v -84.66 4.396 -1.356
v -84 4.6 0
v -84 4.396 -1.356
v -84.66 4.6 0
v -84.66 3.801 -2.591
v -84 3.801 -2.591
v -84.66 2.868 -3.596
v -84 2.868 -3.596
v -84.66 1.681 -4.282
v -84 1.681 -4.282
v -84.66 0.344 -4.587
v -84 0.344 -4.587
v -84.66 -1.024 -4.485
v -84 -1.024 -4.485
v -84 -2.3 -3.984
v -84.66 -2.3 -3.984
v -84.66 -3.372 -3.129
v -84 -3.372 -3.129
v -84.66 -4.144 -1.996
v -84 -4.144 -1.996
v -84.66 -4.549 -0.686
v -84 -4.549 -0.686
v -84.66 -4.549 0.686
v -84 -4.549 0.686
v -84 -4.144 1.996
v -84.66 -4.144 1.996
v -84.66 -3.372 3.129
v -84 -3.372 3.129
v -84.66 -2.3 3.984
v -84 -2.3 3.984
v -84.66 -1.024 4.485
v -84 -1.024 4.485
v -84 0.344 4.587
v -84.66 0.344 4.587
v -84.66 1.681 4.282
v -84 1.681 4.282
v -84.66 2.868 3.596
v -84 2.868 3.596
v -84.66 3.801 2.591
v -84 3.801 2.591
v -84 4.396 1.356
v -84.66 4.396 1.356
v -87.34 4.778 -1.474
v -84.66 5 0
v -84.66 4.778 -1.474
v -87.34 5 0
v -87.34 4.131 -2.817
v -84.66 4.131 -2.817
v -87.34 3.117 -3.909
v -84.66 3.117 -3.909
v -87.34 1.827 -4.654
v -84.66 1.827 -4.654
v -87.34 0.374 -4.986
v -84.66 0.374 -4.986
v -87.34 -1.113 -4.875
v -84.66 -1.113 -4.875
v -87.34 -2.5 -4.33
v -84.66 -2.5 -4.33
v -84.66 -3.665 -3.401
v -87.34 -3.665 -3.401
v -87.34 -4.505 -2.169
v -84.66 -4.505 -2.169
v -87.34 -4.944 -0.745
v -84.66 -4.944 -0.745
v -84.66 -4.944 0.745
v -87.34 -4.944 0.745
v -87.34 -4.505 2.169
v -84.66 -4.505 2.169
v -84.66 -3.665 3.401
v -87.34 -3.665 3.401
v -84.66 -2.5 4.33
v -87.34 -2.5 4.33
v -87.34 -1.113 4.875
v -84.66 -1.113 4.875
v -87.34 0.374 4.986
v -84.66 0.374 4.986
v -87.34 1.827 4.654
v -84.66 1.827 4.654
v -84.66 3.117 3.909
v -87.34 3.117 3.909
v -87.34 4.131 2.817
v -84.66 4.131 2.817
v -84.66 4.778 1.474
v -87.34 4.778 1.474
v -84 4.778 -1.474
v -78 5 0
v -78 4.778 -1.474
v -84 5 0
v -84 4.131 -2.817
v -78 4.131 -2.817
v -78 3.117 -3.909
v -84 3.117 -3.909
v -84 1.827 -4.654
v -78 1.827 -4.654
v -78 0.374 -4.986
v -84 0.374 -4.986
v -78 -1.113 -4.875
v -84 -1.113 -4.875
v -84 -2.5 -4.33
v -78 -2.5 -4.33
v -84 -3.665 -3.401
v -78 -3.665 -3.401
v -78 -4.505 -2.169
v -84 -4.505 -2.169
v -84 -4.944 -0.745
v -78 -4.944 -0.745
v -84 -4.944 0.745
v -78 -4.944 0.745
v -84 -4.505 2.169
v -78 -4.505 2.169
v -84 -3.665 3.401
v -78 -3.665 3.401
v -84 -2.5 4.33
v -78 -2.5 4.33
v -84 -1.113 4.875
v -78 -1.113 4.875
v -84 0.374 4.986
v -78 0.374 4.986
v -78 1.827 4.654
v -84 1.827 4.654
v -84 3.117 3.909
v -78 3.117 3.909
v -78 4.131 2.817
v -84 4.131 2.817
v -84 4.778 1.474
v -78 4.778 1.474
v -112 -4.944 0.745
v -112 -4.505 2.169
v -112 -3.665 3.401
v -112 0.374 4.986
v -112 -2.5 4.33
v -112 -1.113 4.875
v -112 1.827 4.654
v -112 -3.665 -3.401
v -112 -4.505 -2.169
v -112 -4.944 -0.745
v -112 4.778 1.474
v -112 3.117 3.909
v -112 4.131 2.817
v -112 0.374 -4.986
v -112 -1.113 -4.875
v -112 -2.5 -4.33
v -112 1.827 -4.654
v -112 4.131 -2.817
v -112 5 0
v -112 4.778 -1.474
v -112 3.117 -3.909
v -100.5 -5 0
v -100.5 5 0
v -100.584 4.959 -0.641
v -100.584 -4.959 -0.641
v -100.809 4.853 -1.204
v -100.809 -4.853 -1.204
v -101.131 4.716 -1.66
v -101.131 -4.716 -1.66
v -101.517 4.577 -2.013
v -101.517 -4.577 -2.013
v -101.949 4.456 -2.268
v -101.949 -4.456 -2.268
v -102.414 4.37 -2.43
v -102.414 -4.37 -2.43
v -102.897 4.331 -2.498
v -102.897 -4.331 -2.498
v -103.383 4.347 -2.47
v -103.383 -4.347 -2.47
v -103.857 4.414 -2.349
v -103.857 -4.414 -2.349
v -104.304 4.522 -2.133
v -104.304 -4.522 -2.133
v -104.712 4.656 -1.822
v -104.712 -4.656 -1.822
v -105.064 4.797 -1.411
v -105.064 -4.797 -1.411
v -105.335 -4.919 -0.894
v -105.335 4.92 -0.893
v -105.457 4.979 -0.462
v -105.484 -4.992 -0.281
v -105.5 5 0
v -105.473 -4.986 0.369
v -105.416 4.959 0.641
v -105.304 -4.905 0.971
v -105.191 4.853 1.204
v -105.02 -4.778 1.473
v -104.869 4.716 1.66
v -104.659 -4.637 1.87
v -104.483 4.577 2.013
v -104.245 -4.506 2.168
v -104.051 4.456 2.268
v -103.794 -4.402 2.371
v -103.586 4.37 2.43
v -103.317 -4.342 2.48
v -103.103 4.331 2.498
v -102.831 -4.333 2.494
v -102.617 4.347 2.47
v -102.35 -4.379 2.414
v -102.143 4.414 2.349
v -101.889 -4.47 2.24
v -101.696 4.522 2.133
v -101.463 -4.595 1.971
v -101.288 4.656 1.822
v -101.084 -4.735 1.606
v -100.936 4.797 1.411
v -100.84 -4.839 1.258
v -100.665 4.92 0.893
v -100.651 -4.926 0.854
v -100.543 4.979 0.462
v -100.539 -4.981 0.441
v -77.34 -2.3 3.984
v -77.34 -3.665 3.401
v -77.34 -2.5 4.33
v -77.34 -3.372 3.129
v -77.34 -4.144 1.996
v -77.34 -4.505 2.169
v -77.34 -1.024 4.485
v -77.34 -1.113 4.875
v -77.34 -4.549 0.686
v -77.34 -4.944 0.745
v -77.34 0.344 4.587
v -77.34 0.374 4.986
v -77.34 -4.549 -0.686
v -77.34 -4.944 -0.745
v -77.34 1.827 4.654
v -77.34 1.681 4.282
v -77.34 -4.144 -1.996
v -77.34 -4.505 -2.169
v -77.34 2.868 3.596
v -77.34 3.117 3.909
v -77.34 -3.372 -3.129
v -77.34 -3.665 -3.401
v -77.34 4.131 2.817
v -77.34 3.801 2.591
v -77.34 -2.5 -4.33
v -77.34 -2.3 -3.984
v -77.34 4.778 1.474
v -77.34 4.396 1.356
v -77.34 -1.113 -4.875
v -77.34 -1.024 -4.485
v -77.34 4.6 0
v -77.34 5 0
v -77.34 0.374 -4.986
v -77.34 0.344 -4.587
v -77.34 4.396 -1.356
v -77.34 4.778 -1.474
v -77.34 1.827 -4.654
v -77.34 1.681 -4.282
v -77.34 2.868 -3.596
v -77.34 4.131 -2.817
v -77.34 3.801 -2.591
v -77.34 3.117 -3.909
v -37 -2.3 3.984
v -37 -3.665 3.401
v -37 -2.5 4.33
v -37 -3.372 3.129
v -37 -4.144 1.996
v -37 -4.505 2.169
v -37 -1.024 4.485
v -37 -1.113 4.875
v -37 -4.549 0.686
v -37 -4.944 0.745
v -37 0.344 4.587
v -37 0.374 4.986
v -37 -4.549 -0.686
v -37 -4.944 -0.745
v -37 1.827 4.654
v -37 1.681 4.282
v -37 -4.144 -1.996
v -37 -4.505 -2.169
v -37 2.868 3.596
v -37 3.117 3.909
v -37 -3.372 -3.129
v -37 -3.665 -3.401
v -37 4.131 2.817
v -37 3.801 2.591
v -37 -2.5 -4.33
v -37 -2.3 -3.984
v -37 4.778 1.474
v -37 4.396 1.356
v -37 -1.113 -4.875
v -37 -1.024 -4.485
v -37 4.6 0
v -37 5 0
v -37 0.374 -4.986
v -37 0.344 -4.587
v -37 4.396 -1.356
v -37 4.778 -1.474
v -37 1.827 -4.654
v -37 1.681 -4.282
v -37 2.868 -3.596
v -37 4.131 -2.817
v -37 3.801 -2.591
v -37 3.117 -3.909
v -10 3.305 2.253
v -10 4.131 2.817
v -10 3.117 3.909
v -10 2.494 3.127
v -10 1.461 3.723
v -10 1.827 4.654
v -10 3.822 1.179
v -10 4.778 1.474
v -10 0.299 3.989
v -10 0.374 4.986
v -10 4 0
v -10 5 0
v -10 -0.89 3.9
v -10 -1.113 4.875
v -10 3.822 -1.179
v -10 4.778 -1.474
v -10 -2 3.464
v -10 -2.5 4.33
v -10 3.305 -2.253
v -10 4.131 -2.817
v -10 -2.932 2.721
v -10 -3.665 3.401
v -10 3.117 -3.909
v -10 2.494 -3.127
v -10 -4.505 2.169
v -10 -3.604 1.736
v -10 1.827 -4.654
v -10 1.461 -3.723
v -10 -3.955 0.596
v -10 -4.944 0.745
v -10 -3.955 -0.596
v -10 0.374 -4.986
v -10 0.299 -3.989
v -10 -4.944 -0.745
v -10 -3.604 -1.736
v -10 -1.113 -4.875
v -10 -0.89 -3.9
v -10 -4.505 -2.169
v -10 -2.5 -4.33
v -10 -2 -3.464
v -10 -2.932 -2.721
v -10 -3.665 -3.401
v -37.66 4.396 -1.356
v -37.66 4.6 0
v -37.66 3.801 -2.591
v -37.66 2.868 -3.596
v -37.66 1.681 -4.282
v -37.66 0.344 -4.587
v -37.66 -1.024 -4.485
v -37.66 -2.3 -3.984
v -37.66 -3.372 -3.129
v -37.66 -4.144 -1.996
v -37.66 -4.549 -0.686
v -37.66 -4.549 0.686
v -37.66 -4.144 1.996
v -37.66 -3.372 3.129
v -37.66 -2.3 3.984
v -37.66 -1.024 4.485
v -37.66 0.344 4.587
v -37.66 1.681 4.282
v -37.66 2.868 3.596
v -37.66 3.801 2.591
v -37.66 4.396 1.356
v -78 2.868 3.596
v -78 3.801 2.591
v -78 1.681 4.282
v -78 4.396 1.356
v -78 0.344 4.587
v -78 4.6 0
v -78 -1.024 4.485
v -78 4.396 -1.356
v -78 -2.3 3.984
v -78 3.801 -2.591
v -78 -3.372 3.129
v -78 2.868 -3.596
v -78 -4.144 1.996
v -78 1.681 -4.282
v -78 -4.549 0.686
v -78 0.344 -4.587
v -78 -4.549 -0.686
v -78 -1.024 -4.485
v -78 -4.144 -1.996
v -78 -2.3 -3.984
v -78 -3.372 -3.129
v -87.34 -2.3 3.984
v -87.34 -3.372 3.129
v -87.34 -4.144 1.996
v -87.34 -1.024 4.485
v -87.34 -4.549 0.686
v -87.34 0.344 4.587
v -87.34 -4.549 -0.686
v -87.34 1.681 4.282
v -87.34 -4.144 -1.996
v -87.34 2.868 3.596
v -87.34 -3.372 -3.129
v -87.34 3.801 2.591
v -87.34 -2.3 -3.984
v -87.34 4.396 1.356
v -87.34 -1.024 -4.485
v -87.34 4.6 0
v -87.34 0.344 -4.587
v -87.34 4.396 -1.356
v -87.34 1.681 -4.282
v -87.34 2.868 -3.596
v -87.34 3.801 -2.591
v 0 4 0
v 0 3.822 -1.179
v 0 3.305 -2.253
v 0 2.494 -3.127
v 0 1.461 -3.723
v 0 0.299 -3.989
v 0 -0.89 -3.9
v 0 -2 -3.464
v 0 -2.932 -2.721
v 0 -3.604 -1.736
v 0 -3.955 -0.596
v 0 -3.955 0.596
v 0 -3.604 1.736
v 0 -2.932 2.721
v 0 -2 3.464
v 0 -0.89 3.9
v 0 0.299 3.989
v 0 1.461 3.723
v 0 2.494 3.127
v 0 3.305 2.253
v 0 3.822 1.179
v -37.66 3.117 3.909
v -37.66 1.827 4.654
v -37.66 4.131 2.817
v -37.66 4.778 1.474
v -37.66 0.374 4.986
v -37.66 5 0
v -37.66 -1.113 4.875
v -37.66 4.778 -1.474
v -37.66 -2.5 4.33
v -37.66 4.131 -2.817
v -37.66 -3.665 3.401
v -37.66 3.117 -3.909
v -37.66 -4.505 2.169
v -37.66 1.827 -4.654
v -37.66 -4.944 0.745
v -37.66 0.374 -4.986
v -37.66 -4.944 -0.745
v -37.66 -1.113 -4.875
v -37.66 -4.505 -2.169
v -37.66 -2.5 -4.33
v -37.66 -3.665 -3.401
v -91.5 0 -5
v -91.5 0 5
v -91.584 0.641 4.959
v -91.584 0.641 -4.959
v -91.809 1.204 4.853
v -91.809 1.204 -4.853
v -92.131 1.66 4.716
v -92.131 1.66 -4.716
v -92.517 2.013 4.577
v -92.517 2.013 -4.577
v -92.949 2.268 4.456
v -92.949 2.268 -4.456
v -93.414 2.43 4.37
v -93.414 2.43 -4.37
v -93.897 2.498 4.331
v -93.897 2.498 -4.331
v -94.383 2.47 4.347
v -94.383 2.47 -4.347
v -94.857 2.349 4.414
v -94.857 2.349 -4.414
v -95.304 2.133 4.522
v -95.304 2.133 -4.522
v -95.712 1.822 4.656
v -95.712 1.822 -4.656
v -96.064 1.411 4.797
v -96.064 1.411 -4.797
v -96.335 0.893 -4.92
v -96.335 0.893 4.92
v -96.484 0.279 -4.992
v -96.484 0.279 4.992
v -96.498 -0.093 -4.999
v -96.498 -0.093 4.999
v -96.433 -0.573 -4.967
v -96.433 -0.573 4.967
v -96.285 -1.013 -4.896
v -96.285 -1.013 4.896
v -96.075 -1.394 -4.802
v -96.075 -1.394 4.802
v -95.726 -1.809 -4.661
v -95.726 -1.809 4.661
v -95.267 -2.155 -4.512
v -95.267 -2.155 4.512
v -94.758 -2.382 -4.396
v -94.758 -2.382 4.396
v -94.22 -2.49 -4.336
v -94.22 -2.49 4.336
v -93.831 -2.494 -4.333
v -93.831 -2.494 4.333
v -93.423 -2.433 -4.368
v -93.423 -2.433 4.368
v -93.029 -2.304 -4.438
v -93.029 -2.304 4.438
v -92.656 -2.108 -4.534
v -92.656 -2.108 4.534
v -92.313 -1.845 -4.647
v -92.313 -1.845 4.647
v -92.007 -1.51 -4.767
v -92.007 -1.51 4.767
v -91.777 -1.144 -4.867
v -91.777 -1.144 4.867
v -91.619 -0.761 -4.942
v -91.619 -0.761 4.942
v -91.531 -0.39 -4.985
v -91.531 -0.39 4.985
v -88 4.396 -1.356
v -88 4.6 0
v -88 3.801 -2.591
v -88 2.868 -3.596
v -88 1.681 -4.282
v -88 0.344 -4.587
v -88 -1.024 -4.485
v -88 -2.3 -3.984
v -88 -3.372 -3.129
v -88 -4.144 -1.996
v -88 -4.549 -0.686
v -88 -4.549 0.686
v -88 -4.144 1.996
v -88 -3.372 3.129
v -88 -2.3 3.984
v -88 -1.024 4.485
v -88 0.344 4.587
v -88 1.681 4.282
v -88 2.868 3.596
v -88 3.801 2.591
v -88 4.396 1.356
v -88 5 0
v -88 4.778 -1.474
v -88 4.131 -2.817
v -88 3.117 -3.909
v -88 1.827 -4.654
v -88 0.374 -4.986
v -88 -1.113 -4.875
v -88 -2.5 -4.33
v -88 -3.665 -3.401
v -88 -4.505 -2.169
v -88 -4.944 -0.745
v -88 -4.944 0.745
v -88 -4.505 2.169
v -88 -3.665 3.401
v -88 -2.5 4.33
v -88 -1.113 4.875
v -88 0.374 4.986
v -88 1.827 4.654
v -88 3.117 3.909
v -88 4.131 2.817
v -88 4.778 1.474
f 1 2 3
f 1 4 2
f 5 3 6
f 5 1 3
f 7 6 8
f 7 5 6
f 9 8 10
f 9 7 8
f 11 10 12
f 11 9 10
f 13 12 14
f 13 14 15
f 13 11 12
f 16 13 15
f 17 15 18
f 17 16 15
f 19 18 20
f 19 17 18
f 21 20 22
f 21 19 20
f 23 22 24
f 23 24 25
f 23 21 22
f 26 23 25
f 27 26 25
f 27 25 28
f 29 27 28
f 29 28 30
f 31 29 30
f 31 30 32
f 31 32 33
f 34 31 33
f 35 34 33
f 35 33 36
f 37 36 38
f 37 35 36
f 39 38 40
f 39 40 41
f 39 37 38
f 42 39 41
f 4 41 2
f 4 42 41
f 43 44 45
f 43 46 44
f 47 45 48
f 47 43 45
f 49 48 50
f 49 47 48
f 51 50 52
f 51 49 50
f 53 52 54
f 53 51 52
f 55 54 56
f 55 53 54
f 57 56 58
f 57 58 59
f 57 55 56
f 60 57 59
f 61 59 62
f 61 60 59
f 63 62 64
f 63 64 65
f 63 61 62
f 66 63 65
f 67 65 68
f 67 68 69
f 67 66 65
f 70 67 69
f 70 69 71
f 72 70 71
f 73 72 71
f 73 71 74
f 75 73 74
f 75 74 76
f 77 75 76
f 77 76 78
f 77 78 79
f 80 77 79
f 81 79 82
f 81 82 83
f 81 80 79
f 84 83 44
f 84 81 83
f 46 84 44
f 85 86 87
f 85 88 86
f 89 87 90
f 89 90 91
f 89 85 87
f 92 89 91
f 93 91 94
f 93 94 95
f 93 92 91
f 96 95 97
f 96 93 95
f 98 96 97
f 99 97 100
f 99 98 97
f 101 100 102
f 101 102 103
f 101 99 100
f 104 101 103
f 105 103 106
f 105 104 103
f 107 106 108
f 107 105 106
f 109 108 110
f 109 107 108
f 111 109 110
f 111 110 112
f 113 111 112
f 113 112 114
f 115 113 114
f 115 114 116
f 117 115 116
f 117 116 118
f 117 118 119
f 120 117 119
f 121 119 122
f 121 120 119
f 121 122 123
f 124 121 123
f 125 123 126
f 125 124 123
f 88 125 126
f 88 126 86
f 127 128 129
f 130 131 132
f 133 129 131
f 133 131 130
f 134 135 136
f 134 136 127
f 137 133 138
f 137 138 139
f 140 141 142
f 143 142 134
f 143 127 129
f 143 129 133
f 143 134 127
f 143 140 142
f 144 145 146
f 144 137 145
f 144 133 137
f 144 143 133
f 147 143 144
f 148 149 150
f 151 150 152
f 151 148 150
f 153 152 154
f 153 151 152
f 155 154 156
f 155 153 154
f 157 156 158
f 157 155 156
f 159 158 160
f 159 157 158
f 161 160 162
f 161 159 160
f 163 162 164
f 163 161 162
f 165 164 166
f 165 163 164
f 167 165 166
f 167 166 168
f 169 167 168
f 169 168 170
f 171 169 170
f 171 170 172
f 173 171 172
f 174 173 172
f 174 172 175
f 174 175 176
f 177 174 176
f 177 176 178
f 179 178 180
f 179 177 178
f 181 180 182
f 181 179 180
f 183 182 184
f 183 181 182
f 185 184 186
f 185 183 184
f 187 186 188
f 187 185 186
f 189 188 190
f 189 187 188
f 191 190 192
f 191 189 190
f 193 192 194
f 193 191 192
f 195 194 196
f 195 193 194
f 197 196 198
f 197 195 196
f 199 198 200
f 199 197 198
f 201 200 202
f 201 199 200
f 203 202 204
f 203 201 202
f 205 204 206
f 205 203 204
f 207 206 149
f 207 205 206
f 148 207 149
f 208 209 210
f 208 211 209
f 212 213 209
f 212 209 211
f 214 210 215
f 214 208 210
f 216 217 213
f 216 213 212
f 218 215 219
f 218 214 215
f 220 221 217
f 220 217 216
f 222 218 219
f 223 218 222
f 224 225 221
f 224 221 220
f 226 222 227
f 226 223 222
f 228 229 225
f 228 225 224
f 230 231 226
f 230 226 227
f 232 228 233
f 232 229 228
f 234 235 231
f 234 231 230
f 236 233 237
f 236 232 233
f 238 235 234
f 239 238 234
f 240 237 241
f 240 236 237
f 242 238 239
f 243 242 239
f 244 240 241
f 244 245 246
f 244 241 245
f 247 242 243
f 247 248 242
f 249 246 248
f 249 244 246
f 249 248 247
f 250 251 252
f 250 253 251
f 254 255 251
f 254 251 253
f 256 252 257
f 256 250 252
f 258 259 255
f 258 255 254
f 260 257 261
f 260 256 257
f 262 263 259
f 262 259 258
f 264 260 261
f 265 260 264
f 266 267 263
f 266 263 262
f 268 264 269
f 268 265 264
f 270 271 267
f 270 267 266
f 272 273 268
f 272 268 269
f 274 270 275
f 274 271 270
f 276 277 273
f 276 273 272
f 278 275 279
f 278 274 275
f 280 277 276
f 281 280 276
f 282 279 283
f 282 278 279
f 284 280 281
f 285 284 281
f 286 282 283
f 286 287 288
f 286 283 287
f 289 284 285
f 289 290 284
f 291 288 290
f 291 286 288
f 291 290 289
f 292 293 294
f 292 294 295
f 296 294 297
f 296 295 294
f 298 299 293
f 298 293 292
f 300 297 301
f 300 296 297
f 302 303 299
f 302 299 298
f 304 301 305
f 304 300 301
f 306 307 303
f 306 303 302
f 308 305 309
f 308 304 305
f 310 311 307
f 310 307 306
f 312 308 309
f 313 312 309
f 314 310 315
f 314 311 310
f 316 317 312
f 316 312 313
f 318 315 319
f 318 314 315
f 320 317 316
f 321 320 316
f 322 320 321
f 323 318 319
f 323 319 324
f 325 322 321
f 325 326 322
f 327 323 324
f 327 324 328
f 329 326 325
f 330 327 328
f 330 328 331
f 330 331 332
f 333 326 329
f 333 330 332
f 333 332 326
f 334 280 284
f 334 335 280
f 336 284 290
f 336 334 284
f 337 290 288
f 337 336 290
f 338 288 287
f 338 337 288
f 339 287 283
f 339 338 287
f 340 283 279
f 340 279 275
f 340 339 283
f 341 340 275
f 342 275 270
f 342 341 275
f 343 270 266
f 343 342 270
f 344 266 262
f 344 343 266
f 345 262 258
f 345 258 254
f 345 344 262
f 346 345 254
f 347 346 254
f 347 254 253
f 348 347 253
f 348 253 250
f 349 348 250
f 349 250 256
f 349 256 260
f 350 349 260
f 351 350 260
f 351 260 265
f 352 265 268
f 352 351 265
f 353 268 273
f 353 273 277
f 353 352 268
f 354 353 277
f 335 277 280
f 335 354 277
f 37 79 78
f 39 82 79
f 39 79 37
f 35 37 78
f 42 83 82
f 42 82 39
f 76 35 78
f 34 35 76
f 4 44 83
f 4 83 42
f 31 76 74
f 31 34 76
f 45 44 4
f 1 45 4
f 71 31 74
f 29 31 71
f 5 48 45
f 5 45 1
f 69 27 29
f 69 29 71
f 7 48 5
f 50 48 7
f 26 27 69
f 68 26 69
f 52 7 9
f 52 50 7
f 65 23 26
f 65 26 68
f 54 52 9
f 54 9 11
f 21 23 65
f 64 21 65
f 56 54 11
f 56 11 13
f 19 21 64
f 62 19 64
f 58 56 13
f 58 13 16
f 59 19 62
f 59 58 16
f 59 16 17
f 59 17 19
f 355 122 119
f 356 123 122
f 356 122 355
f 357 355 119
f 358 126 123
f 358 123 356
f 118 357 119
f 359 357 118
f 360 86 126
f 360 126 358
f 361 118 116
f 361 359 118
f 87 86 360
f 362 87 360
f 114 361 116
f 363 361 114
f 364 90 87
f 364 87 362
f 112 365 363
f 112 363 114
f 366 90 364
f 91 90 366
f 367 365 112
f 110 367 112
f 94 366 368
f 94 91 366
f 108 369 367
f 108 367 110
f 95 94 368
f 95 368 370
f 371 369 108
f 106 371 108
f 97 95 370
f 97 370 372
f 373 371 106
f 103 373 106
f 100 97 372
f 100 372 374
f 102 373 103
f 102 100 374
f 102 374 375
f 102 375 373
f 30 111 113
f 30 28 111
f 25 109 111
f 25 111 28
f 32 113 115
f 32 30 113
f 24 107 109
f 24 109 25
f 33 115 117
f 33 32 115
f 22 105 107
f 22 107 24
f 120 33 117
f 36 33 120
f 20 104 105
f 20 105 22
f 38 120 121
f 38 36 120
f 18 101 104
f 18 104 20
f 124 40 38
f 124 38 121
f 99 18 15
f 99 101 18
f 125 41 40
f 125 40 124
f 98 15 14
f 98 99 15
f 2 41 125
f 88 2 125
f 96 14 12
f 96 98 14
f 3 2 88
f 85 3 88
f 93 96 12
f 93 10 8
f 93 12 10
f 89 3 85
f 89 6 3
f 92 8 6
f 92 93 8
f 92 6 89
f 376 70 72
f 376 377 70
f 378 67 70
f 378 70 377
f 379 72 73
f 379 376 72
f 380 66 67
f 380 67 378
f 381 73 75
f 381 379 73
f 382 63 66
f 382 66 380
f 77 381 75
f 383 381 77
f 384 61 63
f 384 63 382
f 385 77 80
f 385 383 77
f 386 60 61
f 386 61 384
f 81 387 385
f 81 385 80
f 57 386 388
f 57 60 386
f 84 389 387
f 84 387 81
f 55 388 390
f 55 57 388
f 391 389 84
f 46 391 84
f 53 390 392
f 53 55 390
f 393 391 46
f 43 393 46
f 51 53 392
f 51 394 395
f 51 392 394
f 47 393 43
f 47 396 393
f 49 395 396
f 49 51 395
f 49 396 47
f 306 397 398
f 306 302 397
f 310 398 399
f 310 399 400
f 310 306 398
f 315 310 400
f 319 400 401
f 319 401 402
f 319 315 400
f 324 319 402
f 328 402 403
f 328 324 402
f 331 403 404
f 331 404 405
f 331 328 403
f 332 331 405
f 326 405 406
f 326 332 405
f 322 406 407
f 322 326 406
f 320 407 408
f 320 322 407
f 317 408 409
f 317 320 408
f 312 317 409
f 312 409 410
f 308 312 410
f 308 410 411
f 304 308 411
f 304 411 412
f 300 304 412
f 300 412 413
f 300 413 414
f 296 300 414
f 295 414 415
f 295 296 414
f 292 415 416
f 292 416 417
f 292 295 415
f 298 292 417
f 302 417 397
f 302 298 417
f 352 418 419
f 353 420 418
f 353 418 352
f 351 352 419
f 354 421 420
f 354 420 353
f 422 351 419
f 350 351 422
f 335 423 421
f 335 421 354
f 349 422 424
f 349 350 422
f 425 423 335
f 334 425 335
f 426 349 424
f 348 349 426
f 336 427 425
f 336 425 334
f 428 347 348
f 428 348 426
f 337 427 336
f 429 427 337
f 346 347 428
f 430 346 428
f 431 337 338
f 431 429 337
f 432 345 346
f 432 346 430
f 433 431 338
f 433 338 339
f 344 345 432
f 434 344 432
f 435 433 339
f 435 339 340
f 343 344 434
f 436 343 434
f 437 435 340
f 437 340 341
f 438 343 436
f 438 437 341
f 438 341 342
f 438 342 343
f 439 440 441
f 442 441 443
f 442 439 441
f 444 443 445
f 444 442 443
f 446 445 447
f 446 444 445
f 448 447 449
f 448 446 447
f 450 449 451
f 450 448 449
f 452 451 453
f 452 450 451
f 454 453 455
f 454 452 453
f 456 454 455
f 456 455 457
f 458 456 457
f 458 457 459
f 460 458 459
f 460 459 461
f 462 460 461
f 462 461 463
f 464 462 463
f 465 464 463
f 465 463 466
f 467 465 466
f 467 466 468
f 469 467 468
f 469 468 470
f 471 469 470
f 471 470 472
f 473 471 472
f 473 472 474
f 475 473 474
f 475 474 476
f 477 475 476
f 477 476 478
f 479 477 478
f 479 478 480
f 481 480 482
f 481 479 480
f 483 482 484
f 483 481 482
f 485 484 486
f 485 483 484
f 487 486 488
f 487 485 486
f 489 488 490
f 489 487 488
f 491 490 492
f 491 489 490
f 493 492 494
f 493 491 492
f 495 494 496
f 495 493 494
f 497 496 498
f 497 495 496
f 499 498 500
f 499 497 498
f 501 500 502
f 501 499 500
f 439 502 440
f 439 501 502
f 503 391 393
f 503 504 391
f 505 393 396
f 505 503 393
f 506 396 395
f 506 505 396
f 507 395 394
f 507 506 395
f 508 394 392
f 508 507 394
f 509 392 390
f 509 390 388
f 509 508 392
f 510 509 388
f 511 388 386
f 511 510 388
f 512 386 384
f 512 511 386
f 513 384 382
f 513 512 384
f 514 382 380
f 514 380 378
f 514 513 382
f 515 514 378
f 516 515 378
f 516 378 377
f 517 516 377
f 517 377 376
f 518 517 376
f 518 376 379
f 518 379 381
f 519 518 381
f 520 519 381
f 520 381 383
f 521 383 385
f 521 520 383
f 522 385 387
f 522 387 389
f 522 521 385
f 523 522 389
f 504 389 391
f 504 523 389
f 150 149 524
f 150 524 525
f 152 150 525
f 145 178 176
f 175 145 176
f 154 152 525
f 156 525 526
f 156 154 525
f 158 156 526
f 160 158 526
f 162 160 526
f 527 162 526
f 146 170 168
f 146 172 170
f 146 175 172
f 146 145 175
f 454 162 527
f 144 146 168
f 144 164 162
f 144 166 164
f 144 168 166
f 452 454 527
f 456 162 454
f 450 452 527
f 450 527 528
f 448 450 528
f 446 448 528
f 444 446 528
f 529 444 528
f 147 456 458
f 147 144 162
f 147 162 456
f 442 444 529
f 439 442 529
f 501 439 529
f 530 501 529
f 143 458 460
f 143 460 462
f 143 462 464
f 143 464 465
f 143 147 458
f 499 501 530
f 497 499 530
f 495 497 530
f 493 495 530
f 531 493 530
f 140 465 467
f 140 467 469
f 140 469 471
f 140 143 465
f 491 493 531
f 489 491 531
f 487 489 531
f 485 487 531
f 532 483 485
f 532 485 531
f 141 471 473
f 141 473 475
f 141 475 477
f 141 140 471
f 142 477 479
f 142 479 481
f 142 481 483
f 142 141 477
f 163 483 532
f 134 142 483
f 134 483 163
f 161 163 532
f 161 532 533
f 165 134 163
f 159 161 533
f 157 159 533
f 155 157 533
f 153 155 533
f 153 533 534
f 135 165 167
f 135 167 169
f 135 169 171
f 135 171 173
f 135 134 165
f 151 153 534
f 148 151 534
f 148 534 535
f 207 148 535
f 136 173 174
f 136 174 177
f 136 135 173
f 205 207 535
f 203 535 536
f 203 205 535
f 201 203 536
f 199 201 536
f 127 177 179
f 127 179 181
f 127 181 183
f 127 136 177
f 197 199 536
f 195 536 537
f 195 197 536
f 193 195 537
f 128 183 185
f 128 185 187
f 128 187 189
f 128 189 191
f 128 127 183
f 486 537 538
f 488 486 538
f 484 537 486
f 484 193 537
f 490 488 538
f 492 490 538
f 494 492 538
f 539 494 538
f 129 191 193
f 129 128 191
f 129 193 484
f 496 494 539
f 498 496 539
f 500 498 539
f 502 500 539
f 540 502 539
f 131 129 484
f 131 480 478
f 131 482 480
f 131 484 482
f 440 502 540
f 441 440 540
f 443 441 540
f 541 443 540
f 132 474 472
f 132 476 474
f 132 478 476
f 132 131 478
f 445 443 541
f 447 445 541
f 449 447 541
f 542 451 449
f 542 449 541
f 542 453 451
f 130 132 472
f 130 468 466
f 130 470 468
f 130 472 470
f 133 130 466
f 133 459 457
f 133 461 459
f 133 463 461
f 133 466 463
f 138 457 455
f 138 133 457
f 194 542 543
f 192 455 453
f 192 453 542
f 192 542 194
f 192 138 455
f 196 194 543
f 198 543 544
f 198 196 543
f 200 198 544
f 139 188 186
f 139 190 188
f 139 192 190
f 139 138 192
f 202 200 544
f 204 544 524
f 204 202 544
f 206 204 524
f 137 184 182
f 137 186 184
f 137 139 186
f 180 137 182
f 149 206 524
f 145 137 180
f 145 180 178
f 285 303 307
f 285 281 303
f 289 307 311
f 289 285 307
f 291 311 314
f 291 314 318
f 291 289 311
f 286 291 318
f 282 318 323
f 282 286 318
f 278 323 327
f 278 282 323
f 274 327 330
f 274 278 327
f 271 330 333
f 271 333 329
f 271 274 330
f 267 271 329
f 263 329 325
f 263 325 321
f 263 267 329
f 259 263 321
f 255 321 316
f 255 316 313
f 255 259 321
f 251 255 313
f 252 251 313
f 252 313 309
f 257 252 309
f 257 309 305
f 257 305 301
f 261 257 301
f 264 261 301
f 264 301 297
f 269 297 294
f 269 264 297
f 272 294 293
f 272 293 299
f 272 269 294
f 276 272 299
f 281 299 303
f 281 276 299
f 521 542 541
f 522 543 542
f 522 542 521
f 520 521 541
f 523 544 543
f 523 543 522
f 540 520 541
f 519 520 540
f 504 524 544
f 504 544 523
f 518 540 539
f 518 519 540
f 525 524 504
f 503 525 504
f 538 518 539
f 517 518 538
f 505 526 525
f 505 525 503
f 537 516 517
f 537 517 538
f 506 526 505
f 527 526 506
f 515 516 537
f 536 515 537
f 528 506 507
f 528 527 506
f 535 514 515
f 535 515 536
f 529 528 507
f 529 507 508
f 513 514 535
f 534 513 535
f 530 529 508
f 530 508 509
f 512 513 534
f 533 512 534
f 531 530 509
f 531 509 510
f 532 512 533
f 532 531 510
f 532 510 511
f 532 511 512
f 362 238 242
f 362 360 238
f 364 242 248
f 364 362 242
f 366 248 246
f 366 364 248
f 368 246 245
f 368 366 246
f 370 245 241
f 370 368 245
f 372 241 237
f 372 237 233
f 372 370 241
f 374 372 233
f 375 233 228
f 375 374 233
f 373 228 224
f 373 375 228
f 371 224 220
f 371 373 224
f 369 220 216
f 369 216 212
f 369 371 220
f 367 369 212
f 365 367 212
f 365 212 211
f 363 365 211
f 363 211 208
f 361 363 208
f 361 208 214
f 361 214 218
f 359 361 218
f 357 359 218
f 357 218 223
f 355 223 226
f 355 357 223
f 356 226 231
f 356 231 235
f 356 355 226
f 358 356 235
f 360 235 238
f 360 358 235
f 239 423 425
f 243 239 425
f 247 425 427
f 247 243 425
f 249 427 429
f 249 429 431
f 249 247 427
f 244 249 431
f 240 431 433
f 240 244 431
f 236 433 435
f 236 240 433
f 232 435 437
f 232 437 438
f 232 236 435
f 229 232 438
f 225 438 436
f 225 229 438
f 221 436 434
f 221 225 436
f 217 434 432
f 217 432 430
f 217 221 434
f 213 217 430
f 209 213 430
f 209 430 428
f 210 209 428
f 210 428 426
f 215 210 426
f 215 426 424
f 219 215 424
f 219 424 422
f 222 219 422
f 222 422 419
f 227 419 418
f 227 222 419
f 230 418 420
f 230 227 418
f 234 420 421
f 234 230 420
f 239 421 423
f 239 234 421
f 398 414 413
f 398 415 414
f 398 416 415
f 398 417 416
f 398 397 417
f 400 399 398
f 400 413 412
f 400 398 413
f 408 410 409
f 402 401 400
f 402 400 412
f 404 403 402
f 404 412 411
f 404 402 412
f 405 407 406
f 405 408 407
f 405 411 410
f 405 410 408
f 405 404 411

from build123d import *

# Parameters (mm, degrees)
CUT_EXTRUDE1_DEPTH      = 113.222992297
CUT_EXTRUDE1_DEPTH_BACK = 113.222992297
SKETCH2_R               = 2.5
CUT_EXTRUDE2_DEPTH      = 113.222992405
CUT_EXTRUDE2_DEPTH_BACK = 113.222992405
SKETCH4_R               = 2.5


with BuildPart() as part:
    # Sketch1 → Revolve1 (revolve)
    with BuildSketch(Plane.XY):
        Polygon((0, 0), (0, 4), (-10, 4), (-10, 5), (-37, 5), (-37, 4.6), (-37.66, 4.6), (-37.66, 5), (-77.34, 5), (-77.34, 4.6), (-78, 4.6), (-78, 5), (-84, 5), (-84, 4.6), (-84.66, 4.6), (-84.66, 5), (-87.34, 5), (-87.34, 4.6), (-88, 4.6), (-88, 5), (-112, 5), (-112, 0), align=None)
    revolve(axis=Axis((0, 0, 0), (-1, 0, 0)))

    # Sketch2 → Cut-Extrude1 (cut, two sides: drawn at the far end of the back side and taken through both)
    with BuildSketch(Plane(origin=(0, 0, 0), x_dir=(1, 0, 0), z_dir=(0, 1, 0)).offset(-CUT_EXTRUDE1_DEPTH_BACK)):
        with Locations((-103, 0)):
            Circle(SKETCH2_R)
    extrude(amount=CUT_EXTRUDE1_DEPTH + CUT_EXTRUDE1_DEPTH_BACK, mode=Mode.SUBTRACT)

    # Sketch4 → Cut-Extrude2 (cut, two sides: drawn at the far end of the back side and taken through both)
    with BuildSketch(Plane.XY.offset(-CUT_EXTRUDE2_DEPTH_BACK)):
        with Locations((-94, 0)):
            Circle(SKETCH4_R)
    extrude(amount=CUT_EXTRUDE2_DEPTH + CUT_EXTRUDE2_DEPTH_BACK, mode=Mode.SUBTRACT)


solid = part.part
